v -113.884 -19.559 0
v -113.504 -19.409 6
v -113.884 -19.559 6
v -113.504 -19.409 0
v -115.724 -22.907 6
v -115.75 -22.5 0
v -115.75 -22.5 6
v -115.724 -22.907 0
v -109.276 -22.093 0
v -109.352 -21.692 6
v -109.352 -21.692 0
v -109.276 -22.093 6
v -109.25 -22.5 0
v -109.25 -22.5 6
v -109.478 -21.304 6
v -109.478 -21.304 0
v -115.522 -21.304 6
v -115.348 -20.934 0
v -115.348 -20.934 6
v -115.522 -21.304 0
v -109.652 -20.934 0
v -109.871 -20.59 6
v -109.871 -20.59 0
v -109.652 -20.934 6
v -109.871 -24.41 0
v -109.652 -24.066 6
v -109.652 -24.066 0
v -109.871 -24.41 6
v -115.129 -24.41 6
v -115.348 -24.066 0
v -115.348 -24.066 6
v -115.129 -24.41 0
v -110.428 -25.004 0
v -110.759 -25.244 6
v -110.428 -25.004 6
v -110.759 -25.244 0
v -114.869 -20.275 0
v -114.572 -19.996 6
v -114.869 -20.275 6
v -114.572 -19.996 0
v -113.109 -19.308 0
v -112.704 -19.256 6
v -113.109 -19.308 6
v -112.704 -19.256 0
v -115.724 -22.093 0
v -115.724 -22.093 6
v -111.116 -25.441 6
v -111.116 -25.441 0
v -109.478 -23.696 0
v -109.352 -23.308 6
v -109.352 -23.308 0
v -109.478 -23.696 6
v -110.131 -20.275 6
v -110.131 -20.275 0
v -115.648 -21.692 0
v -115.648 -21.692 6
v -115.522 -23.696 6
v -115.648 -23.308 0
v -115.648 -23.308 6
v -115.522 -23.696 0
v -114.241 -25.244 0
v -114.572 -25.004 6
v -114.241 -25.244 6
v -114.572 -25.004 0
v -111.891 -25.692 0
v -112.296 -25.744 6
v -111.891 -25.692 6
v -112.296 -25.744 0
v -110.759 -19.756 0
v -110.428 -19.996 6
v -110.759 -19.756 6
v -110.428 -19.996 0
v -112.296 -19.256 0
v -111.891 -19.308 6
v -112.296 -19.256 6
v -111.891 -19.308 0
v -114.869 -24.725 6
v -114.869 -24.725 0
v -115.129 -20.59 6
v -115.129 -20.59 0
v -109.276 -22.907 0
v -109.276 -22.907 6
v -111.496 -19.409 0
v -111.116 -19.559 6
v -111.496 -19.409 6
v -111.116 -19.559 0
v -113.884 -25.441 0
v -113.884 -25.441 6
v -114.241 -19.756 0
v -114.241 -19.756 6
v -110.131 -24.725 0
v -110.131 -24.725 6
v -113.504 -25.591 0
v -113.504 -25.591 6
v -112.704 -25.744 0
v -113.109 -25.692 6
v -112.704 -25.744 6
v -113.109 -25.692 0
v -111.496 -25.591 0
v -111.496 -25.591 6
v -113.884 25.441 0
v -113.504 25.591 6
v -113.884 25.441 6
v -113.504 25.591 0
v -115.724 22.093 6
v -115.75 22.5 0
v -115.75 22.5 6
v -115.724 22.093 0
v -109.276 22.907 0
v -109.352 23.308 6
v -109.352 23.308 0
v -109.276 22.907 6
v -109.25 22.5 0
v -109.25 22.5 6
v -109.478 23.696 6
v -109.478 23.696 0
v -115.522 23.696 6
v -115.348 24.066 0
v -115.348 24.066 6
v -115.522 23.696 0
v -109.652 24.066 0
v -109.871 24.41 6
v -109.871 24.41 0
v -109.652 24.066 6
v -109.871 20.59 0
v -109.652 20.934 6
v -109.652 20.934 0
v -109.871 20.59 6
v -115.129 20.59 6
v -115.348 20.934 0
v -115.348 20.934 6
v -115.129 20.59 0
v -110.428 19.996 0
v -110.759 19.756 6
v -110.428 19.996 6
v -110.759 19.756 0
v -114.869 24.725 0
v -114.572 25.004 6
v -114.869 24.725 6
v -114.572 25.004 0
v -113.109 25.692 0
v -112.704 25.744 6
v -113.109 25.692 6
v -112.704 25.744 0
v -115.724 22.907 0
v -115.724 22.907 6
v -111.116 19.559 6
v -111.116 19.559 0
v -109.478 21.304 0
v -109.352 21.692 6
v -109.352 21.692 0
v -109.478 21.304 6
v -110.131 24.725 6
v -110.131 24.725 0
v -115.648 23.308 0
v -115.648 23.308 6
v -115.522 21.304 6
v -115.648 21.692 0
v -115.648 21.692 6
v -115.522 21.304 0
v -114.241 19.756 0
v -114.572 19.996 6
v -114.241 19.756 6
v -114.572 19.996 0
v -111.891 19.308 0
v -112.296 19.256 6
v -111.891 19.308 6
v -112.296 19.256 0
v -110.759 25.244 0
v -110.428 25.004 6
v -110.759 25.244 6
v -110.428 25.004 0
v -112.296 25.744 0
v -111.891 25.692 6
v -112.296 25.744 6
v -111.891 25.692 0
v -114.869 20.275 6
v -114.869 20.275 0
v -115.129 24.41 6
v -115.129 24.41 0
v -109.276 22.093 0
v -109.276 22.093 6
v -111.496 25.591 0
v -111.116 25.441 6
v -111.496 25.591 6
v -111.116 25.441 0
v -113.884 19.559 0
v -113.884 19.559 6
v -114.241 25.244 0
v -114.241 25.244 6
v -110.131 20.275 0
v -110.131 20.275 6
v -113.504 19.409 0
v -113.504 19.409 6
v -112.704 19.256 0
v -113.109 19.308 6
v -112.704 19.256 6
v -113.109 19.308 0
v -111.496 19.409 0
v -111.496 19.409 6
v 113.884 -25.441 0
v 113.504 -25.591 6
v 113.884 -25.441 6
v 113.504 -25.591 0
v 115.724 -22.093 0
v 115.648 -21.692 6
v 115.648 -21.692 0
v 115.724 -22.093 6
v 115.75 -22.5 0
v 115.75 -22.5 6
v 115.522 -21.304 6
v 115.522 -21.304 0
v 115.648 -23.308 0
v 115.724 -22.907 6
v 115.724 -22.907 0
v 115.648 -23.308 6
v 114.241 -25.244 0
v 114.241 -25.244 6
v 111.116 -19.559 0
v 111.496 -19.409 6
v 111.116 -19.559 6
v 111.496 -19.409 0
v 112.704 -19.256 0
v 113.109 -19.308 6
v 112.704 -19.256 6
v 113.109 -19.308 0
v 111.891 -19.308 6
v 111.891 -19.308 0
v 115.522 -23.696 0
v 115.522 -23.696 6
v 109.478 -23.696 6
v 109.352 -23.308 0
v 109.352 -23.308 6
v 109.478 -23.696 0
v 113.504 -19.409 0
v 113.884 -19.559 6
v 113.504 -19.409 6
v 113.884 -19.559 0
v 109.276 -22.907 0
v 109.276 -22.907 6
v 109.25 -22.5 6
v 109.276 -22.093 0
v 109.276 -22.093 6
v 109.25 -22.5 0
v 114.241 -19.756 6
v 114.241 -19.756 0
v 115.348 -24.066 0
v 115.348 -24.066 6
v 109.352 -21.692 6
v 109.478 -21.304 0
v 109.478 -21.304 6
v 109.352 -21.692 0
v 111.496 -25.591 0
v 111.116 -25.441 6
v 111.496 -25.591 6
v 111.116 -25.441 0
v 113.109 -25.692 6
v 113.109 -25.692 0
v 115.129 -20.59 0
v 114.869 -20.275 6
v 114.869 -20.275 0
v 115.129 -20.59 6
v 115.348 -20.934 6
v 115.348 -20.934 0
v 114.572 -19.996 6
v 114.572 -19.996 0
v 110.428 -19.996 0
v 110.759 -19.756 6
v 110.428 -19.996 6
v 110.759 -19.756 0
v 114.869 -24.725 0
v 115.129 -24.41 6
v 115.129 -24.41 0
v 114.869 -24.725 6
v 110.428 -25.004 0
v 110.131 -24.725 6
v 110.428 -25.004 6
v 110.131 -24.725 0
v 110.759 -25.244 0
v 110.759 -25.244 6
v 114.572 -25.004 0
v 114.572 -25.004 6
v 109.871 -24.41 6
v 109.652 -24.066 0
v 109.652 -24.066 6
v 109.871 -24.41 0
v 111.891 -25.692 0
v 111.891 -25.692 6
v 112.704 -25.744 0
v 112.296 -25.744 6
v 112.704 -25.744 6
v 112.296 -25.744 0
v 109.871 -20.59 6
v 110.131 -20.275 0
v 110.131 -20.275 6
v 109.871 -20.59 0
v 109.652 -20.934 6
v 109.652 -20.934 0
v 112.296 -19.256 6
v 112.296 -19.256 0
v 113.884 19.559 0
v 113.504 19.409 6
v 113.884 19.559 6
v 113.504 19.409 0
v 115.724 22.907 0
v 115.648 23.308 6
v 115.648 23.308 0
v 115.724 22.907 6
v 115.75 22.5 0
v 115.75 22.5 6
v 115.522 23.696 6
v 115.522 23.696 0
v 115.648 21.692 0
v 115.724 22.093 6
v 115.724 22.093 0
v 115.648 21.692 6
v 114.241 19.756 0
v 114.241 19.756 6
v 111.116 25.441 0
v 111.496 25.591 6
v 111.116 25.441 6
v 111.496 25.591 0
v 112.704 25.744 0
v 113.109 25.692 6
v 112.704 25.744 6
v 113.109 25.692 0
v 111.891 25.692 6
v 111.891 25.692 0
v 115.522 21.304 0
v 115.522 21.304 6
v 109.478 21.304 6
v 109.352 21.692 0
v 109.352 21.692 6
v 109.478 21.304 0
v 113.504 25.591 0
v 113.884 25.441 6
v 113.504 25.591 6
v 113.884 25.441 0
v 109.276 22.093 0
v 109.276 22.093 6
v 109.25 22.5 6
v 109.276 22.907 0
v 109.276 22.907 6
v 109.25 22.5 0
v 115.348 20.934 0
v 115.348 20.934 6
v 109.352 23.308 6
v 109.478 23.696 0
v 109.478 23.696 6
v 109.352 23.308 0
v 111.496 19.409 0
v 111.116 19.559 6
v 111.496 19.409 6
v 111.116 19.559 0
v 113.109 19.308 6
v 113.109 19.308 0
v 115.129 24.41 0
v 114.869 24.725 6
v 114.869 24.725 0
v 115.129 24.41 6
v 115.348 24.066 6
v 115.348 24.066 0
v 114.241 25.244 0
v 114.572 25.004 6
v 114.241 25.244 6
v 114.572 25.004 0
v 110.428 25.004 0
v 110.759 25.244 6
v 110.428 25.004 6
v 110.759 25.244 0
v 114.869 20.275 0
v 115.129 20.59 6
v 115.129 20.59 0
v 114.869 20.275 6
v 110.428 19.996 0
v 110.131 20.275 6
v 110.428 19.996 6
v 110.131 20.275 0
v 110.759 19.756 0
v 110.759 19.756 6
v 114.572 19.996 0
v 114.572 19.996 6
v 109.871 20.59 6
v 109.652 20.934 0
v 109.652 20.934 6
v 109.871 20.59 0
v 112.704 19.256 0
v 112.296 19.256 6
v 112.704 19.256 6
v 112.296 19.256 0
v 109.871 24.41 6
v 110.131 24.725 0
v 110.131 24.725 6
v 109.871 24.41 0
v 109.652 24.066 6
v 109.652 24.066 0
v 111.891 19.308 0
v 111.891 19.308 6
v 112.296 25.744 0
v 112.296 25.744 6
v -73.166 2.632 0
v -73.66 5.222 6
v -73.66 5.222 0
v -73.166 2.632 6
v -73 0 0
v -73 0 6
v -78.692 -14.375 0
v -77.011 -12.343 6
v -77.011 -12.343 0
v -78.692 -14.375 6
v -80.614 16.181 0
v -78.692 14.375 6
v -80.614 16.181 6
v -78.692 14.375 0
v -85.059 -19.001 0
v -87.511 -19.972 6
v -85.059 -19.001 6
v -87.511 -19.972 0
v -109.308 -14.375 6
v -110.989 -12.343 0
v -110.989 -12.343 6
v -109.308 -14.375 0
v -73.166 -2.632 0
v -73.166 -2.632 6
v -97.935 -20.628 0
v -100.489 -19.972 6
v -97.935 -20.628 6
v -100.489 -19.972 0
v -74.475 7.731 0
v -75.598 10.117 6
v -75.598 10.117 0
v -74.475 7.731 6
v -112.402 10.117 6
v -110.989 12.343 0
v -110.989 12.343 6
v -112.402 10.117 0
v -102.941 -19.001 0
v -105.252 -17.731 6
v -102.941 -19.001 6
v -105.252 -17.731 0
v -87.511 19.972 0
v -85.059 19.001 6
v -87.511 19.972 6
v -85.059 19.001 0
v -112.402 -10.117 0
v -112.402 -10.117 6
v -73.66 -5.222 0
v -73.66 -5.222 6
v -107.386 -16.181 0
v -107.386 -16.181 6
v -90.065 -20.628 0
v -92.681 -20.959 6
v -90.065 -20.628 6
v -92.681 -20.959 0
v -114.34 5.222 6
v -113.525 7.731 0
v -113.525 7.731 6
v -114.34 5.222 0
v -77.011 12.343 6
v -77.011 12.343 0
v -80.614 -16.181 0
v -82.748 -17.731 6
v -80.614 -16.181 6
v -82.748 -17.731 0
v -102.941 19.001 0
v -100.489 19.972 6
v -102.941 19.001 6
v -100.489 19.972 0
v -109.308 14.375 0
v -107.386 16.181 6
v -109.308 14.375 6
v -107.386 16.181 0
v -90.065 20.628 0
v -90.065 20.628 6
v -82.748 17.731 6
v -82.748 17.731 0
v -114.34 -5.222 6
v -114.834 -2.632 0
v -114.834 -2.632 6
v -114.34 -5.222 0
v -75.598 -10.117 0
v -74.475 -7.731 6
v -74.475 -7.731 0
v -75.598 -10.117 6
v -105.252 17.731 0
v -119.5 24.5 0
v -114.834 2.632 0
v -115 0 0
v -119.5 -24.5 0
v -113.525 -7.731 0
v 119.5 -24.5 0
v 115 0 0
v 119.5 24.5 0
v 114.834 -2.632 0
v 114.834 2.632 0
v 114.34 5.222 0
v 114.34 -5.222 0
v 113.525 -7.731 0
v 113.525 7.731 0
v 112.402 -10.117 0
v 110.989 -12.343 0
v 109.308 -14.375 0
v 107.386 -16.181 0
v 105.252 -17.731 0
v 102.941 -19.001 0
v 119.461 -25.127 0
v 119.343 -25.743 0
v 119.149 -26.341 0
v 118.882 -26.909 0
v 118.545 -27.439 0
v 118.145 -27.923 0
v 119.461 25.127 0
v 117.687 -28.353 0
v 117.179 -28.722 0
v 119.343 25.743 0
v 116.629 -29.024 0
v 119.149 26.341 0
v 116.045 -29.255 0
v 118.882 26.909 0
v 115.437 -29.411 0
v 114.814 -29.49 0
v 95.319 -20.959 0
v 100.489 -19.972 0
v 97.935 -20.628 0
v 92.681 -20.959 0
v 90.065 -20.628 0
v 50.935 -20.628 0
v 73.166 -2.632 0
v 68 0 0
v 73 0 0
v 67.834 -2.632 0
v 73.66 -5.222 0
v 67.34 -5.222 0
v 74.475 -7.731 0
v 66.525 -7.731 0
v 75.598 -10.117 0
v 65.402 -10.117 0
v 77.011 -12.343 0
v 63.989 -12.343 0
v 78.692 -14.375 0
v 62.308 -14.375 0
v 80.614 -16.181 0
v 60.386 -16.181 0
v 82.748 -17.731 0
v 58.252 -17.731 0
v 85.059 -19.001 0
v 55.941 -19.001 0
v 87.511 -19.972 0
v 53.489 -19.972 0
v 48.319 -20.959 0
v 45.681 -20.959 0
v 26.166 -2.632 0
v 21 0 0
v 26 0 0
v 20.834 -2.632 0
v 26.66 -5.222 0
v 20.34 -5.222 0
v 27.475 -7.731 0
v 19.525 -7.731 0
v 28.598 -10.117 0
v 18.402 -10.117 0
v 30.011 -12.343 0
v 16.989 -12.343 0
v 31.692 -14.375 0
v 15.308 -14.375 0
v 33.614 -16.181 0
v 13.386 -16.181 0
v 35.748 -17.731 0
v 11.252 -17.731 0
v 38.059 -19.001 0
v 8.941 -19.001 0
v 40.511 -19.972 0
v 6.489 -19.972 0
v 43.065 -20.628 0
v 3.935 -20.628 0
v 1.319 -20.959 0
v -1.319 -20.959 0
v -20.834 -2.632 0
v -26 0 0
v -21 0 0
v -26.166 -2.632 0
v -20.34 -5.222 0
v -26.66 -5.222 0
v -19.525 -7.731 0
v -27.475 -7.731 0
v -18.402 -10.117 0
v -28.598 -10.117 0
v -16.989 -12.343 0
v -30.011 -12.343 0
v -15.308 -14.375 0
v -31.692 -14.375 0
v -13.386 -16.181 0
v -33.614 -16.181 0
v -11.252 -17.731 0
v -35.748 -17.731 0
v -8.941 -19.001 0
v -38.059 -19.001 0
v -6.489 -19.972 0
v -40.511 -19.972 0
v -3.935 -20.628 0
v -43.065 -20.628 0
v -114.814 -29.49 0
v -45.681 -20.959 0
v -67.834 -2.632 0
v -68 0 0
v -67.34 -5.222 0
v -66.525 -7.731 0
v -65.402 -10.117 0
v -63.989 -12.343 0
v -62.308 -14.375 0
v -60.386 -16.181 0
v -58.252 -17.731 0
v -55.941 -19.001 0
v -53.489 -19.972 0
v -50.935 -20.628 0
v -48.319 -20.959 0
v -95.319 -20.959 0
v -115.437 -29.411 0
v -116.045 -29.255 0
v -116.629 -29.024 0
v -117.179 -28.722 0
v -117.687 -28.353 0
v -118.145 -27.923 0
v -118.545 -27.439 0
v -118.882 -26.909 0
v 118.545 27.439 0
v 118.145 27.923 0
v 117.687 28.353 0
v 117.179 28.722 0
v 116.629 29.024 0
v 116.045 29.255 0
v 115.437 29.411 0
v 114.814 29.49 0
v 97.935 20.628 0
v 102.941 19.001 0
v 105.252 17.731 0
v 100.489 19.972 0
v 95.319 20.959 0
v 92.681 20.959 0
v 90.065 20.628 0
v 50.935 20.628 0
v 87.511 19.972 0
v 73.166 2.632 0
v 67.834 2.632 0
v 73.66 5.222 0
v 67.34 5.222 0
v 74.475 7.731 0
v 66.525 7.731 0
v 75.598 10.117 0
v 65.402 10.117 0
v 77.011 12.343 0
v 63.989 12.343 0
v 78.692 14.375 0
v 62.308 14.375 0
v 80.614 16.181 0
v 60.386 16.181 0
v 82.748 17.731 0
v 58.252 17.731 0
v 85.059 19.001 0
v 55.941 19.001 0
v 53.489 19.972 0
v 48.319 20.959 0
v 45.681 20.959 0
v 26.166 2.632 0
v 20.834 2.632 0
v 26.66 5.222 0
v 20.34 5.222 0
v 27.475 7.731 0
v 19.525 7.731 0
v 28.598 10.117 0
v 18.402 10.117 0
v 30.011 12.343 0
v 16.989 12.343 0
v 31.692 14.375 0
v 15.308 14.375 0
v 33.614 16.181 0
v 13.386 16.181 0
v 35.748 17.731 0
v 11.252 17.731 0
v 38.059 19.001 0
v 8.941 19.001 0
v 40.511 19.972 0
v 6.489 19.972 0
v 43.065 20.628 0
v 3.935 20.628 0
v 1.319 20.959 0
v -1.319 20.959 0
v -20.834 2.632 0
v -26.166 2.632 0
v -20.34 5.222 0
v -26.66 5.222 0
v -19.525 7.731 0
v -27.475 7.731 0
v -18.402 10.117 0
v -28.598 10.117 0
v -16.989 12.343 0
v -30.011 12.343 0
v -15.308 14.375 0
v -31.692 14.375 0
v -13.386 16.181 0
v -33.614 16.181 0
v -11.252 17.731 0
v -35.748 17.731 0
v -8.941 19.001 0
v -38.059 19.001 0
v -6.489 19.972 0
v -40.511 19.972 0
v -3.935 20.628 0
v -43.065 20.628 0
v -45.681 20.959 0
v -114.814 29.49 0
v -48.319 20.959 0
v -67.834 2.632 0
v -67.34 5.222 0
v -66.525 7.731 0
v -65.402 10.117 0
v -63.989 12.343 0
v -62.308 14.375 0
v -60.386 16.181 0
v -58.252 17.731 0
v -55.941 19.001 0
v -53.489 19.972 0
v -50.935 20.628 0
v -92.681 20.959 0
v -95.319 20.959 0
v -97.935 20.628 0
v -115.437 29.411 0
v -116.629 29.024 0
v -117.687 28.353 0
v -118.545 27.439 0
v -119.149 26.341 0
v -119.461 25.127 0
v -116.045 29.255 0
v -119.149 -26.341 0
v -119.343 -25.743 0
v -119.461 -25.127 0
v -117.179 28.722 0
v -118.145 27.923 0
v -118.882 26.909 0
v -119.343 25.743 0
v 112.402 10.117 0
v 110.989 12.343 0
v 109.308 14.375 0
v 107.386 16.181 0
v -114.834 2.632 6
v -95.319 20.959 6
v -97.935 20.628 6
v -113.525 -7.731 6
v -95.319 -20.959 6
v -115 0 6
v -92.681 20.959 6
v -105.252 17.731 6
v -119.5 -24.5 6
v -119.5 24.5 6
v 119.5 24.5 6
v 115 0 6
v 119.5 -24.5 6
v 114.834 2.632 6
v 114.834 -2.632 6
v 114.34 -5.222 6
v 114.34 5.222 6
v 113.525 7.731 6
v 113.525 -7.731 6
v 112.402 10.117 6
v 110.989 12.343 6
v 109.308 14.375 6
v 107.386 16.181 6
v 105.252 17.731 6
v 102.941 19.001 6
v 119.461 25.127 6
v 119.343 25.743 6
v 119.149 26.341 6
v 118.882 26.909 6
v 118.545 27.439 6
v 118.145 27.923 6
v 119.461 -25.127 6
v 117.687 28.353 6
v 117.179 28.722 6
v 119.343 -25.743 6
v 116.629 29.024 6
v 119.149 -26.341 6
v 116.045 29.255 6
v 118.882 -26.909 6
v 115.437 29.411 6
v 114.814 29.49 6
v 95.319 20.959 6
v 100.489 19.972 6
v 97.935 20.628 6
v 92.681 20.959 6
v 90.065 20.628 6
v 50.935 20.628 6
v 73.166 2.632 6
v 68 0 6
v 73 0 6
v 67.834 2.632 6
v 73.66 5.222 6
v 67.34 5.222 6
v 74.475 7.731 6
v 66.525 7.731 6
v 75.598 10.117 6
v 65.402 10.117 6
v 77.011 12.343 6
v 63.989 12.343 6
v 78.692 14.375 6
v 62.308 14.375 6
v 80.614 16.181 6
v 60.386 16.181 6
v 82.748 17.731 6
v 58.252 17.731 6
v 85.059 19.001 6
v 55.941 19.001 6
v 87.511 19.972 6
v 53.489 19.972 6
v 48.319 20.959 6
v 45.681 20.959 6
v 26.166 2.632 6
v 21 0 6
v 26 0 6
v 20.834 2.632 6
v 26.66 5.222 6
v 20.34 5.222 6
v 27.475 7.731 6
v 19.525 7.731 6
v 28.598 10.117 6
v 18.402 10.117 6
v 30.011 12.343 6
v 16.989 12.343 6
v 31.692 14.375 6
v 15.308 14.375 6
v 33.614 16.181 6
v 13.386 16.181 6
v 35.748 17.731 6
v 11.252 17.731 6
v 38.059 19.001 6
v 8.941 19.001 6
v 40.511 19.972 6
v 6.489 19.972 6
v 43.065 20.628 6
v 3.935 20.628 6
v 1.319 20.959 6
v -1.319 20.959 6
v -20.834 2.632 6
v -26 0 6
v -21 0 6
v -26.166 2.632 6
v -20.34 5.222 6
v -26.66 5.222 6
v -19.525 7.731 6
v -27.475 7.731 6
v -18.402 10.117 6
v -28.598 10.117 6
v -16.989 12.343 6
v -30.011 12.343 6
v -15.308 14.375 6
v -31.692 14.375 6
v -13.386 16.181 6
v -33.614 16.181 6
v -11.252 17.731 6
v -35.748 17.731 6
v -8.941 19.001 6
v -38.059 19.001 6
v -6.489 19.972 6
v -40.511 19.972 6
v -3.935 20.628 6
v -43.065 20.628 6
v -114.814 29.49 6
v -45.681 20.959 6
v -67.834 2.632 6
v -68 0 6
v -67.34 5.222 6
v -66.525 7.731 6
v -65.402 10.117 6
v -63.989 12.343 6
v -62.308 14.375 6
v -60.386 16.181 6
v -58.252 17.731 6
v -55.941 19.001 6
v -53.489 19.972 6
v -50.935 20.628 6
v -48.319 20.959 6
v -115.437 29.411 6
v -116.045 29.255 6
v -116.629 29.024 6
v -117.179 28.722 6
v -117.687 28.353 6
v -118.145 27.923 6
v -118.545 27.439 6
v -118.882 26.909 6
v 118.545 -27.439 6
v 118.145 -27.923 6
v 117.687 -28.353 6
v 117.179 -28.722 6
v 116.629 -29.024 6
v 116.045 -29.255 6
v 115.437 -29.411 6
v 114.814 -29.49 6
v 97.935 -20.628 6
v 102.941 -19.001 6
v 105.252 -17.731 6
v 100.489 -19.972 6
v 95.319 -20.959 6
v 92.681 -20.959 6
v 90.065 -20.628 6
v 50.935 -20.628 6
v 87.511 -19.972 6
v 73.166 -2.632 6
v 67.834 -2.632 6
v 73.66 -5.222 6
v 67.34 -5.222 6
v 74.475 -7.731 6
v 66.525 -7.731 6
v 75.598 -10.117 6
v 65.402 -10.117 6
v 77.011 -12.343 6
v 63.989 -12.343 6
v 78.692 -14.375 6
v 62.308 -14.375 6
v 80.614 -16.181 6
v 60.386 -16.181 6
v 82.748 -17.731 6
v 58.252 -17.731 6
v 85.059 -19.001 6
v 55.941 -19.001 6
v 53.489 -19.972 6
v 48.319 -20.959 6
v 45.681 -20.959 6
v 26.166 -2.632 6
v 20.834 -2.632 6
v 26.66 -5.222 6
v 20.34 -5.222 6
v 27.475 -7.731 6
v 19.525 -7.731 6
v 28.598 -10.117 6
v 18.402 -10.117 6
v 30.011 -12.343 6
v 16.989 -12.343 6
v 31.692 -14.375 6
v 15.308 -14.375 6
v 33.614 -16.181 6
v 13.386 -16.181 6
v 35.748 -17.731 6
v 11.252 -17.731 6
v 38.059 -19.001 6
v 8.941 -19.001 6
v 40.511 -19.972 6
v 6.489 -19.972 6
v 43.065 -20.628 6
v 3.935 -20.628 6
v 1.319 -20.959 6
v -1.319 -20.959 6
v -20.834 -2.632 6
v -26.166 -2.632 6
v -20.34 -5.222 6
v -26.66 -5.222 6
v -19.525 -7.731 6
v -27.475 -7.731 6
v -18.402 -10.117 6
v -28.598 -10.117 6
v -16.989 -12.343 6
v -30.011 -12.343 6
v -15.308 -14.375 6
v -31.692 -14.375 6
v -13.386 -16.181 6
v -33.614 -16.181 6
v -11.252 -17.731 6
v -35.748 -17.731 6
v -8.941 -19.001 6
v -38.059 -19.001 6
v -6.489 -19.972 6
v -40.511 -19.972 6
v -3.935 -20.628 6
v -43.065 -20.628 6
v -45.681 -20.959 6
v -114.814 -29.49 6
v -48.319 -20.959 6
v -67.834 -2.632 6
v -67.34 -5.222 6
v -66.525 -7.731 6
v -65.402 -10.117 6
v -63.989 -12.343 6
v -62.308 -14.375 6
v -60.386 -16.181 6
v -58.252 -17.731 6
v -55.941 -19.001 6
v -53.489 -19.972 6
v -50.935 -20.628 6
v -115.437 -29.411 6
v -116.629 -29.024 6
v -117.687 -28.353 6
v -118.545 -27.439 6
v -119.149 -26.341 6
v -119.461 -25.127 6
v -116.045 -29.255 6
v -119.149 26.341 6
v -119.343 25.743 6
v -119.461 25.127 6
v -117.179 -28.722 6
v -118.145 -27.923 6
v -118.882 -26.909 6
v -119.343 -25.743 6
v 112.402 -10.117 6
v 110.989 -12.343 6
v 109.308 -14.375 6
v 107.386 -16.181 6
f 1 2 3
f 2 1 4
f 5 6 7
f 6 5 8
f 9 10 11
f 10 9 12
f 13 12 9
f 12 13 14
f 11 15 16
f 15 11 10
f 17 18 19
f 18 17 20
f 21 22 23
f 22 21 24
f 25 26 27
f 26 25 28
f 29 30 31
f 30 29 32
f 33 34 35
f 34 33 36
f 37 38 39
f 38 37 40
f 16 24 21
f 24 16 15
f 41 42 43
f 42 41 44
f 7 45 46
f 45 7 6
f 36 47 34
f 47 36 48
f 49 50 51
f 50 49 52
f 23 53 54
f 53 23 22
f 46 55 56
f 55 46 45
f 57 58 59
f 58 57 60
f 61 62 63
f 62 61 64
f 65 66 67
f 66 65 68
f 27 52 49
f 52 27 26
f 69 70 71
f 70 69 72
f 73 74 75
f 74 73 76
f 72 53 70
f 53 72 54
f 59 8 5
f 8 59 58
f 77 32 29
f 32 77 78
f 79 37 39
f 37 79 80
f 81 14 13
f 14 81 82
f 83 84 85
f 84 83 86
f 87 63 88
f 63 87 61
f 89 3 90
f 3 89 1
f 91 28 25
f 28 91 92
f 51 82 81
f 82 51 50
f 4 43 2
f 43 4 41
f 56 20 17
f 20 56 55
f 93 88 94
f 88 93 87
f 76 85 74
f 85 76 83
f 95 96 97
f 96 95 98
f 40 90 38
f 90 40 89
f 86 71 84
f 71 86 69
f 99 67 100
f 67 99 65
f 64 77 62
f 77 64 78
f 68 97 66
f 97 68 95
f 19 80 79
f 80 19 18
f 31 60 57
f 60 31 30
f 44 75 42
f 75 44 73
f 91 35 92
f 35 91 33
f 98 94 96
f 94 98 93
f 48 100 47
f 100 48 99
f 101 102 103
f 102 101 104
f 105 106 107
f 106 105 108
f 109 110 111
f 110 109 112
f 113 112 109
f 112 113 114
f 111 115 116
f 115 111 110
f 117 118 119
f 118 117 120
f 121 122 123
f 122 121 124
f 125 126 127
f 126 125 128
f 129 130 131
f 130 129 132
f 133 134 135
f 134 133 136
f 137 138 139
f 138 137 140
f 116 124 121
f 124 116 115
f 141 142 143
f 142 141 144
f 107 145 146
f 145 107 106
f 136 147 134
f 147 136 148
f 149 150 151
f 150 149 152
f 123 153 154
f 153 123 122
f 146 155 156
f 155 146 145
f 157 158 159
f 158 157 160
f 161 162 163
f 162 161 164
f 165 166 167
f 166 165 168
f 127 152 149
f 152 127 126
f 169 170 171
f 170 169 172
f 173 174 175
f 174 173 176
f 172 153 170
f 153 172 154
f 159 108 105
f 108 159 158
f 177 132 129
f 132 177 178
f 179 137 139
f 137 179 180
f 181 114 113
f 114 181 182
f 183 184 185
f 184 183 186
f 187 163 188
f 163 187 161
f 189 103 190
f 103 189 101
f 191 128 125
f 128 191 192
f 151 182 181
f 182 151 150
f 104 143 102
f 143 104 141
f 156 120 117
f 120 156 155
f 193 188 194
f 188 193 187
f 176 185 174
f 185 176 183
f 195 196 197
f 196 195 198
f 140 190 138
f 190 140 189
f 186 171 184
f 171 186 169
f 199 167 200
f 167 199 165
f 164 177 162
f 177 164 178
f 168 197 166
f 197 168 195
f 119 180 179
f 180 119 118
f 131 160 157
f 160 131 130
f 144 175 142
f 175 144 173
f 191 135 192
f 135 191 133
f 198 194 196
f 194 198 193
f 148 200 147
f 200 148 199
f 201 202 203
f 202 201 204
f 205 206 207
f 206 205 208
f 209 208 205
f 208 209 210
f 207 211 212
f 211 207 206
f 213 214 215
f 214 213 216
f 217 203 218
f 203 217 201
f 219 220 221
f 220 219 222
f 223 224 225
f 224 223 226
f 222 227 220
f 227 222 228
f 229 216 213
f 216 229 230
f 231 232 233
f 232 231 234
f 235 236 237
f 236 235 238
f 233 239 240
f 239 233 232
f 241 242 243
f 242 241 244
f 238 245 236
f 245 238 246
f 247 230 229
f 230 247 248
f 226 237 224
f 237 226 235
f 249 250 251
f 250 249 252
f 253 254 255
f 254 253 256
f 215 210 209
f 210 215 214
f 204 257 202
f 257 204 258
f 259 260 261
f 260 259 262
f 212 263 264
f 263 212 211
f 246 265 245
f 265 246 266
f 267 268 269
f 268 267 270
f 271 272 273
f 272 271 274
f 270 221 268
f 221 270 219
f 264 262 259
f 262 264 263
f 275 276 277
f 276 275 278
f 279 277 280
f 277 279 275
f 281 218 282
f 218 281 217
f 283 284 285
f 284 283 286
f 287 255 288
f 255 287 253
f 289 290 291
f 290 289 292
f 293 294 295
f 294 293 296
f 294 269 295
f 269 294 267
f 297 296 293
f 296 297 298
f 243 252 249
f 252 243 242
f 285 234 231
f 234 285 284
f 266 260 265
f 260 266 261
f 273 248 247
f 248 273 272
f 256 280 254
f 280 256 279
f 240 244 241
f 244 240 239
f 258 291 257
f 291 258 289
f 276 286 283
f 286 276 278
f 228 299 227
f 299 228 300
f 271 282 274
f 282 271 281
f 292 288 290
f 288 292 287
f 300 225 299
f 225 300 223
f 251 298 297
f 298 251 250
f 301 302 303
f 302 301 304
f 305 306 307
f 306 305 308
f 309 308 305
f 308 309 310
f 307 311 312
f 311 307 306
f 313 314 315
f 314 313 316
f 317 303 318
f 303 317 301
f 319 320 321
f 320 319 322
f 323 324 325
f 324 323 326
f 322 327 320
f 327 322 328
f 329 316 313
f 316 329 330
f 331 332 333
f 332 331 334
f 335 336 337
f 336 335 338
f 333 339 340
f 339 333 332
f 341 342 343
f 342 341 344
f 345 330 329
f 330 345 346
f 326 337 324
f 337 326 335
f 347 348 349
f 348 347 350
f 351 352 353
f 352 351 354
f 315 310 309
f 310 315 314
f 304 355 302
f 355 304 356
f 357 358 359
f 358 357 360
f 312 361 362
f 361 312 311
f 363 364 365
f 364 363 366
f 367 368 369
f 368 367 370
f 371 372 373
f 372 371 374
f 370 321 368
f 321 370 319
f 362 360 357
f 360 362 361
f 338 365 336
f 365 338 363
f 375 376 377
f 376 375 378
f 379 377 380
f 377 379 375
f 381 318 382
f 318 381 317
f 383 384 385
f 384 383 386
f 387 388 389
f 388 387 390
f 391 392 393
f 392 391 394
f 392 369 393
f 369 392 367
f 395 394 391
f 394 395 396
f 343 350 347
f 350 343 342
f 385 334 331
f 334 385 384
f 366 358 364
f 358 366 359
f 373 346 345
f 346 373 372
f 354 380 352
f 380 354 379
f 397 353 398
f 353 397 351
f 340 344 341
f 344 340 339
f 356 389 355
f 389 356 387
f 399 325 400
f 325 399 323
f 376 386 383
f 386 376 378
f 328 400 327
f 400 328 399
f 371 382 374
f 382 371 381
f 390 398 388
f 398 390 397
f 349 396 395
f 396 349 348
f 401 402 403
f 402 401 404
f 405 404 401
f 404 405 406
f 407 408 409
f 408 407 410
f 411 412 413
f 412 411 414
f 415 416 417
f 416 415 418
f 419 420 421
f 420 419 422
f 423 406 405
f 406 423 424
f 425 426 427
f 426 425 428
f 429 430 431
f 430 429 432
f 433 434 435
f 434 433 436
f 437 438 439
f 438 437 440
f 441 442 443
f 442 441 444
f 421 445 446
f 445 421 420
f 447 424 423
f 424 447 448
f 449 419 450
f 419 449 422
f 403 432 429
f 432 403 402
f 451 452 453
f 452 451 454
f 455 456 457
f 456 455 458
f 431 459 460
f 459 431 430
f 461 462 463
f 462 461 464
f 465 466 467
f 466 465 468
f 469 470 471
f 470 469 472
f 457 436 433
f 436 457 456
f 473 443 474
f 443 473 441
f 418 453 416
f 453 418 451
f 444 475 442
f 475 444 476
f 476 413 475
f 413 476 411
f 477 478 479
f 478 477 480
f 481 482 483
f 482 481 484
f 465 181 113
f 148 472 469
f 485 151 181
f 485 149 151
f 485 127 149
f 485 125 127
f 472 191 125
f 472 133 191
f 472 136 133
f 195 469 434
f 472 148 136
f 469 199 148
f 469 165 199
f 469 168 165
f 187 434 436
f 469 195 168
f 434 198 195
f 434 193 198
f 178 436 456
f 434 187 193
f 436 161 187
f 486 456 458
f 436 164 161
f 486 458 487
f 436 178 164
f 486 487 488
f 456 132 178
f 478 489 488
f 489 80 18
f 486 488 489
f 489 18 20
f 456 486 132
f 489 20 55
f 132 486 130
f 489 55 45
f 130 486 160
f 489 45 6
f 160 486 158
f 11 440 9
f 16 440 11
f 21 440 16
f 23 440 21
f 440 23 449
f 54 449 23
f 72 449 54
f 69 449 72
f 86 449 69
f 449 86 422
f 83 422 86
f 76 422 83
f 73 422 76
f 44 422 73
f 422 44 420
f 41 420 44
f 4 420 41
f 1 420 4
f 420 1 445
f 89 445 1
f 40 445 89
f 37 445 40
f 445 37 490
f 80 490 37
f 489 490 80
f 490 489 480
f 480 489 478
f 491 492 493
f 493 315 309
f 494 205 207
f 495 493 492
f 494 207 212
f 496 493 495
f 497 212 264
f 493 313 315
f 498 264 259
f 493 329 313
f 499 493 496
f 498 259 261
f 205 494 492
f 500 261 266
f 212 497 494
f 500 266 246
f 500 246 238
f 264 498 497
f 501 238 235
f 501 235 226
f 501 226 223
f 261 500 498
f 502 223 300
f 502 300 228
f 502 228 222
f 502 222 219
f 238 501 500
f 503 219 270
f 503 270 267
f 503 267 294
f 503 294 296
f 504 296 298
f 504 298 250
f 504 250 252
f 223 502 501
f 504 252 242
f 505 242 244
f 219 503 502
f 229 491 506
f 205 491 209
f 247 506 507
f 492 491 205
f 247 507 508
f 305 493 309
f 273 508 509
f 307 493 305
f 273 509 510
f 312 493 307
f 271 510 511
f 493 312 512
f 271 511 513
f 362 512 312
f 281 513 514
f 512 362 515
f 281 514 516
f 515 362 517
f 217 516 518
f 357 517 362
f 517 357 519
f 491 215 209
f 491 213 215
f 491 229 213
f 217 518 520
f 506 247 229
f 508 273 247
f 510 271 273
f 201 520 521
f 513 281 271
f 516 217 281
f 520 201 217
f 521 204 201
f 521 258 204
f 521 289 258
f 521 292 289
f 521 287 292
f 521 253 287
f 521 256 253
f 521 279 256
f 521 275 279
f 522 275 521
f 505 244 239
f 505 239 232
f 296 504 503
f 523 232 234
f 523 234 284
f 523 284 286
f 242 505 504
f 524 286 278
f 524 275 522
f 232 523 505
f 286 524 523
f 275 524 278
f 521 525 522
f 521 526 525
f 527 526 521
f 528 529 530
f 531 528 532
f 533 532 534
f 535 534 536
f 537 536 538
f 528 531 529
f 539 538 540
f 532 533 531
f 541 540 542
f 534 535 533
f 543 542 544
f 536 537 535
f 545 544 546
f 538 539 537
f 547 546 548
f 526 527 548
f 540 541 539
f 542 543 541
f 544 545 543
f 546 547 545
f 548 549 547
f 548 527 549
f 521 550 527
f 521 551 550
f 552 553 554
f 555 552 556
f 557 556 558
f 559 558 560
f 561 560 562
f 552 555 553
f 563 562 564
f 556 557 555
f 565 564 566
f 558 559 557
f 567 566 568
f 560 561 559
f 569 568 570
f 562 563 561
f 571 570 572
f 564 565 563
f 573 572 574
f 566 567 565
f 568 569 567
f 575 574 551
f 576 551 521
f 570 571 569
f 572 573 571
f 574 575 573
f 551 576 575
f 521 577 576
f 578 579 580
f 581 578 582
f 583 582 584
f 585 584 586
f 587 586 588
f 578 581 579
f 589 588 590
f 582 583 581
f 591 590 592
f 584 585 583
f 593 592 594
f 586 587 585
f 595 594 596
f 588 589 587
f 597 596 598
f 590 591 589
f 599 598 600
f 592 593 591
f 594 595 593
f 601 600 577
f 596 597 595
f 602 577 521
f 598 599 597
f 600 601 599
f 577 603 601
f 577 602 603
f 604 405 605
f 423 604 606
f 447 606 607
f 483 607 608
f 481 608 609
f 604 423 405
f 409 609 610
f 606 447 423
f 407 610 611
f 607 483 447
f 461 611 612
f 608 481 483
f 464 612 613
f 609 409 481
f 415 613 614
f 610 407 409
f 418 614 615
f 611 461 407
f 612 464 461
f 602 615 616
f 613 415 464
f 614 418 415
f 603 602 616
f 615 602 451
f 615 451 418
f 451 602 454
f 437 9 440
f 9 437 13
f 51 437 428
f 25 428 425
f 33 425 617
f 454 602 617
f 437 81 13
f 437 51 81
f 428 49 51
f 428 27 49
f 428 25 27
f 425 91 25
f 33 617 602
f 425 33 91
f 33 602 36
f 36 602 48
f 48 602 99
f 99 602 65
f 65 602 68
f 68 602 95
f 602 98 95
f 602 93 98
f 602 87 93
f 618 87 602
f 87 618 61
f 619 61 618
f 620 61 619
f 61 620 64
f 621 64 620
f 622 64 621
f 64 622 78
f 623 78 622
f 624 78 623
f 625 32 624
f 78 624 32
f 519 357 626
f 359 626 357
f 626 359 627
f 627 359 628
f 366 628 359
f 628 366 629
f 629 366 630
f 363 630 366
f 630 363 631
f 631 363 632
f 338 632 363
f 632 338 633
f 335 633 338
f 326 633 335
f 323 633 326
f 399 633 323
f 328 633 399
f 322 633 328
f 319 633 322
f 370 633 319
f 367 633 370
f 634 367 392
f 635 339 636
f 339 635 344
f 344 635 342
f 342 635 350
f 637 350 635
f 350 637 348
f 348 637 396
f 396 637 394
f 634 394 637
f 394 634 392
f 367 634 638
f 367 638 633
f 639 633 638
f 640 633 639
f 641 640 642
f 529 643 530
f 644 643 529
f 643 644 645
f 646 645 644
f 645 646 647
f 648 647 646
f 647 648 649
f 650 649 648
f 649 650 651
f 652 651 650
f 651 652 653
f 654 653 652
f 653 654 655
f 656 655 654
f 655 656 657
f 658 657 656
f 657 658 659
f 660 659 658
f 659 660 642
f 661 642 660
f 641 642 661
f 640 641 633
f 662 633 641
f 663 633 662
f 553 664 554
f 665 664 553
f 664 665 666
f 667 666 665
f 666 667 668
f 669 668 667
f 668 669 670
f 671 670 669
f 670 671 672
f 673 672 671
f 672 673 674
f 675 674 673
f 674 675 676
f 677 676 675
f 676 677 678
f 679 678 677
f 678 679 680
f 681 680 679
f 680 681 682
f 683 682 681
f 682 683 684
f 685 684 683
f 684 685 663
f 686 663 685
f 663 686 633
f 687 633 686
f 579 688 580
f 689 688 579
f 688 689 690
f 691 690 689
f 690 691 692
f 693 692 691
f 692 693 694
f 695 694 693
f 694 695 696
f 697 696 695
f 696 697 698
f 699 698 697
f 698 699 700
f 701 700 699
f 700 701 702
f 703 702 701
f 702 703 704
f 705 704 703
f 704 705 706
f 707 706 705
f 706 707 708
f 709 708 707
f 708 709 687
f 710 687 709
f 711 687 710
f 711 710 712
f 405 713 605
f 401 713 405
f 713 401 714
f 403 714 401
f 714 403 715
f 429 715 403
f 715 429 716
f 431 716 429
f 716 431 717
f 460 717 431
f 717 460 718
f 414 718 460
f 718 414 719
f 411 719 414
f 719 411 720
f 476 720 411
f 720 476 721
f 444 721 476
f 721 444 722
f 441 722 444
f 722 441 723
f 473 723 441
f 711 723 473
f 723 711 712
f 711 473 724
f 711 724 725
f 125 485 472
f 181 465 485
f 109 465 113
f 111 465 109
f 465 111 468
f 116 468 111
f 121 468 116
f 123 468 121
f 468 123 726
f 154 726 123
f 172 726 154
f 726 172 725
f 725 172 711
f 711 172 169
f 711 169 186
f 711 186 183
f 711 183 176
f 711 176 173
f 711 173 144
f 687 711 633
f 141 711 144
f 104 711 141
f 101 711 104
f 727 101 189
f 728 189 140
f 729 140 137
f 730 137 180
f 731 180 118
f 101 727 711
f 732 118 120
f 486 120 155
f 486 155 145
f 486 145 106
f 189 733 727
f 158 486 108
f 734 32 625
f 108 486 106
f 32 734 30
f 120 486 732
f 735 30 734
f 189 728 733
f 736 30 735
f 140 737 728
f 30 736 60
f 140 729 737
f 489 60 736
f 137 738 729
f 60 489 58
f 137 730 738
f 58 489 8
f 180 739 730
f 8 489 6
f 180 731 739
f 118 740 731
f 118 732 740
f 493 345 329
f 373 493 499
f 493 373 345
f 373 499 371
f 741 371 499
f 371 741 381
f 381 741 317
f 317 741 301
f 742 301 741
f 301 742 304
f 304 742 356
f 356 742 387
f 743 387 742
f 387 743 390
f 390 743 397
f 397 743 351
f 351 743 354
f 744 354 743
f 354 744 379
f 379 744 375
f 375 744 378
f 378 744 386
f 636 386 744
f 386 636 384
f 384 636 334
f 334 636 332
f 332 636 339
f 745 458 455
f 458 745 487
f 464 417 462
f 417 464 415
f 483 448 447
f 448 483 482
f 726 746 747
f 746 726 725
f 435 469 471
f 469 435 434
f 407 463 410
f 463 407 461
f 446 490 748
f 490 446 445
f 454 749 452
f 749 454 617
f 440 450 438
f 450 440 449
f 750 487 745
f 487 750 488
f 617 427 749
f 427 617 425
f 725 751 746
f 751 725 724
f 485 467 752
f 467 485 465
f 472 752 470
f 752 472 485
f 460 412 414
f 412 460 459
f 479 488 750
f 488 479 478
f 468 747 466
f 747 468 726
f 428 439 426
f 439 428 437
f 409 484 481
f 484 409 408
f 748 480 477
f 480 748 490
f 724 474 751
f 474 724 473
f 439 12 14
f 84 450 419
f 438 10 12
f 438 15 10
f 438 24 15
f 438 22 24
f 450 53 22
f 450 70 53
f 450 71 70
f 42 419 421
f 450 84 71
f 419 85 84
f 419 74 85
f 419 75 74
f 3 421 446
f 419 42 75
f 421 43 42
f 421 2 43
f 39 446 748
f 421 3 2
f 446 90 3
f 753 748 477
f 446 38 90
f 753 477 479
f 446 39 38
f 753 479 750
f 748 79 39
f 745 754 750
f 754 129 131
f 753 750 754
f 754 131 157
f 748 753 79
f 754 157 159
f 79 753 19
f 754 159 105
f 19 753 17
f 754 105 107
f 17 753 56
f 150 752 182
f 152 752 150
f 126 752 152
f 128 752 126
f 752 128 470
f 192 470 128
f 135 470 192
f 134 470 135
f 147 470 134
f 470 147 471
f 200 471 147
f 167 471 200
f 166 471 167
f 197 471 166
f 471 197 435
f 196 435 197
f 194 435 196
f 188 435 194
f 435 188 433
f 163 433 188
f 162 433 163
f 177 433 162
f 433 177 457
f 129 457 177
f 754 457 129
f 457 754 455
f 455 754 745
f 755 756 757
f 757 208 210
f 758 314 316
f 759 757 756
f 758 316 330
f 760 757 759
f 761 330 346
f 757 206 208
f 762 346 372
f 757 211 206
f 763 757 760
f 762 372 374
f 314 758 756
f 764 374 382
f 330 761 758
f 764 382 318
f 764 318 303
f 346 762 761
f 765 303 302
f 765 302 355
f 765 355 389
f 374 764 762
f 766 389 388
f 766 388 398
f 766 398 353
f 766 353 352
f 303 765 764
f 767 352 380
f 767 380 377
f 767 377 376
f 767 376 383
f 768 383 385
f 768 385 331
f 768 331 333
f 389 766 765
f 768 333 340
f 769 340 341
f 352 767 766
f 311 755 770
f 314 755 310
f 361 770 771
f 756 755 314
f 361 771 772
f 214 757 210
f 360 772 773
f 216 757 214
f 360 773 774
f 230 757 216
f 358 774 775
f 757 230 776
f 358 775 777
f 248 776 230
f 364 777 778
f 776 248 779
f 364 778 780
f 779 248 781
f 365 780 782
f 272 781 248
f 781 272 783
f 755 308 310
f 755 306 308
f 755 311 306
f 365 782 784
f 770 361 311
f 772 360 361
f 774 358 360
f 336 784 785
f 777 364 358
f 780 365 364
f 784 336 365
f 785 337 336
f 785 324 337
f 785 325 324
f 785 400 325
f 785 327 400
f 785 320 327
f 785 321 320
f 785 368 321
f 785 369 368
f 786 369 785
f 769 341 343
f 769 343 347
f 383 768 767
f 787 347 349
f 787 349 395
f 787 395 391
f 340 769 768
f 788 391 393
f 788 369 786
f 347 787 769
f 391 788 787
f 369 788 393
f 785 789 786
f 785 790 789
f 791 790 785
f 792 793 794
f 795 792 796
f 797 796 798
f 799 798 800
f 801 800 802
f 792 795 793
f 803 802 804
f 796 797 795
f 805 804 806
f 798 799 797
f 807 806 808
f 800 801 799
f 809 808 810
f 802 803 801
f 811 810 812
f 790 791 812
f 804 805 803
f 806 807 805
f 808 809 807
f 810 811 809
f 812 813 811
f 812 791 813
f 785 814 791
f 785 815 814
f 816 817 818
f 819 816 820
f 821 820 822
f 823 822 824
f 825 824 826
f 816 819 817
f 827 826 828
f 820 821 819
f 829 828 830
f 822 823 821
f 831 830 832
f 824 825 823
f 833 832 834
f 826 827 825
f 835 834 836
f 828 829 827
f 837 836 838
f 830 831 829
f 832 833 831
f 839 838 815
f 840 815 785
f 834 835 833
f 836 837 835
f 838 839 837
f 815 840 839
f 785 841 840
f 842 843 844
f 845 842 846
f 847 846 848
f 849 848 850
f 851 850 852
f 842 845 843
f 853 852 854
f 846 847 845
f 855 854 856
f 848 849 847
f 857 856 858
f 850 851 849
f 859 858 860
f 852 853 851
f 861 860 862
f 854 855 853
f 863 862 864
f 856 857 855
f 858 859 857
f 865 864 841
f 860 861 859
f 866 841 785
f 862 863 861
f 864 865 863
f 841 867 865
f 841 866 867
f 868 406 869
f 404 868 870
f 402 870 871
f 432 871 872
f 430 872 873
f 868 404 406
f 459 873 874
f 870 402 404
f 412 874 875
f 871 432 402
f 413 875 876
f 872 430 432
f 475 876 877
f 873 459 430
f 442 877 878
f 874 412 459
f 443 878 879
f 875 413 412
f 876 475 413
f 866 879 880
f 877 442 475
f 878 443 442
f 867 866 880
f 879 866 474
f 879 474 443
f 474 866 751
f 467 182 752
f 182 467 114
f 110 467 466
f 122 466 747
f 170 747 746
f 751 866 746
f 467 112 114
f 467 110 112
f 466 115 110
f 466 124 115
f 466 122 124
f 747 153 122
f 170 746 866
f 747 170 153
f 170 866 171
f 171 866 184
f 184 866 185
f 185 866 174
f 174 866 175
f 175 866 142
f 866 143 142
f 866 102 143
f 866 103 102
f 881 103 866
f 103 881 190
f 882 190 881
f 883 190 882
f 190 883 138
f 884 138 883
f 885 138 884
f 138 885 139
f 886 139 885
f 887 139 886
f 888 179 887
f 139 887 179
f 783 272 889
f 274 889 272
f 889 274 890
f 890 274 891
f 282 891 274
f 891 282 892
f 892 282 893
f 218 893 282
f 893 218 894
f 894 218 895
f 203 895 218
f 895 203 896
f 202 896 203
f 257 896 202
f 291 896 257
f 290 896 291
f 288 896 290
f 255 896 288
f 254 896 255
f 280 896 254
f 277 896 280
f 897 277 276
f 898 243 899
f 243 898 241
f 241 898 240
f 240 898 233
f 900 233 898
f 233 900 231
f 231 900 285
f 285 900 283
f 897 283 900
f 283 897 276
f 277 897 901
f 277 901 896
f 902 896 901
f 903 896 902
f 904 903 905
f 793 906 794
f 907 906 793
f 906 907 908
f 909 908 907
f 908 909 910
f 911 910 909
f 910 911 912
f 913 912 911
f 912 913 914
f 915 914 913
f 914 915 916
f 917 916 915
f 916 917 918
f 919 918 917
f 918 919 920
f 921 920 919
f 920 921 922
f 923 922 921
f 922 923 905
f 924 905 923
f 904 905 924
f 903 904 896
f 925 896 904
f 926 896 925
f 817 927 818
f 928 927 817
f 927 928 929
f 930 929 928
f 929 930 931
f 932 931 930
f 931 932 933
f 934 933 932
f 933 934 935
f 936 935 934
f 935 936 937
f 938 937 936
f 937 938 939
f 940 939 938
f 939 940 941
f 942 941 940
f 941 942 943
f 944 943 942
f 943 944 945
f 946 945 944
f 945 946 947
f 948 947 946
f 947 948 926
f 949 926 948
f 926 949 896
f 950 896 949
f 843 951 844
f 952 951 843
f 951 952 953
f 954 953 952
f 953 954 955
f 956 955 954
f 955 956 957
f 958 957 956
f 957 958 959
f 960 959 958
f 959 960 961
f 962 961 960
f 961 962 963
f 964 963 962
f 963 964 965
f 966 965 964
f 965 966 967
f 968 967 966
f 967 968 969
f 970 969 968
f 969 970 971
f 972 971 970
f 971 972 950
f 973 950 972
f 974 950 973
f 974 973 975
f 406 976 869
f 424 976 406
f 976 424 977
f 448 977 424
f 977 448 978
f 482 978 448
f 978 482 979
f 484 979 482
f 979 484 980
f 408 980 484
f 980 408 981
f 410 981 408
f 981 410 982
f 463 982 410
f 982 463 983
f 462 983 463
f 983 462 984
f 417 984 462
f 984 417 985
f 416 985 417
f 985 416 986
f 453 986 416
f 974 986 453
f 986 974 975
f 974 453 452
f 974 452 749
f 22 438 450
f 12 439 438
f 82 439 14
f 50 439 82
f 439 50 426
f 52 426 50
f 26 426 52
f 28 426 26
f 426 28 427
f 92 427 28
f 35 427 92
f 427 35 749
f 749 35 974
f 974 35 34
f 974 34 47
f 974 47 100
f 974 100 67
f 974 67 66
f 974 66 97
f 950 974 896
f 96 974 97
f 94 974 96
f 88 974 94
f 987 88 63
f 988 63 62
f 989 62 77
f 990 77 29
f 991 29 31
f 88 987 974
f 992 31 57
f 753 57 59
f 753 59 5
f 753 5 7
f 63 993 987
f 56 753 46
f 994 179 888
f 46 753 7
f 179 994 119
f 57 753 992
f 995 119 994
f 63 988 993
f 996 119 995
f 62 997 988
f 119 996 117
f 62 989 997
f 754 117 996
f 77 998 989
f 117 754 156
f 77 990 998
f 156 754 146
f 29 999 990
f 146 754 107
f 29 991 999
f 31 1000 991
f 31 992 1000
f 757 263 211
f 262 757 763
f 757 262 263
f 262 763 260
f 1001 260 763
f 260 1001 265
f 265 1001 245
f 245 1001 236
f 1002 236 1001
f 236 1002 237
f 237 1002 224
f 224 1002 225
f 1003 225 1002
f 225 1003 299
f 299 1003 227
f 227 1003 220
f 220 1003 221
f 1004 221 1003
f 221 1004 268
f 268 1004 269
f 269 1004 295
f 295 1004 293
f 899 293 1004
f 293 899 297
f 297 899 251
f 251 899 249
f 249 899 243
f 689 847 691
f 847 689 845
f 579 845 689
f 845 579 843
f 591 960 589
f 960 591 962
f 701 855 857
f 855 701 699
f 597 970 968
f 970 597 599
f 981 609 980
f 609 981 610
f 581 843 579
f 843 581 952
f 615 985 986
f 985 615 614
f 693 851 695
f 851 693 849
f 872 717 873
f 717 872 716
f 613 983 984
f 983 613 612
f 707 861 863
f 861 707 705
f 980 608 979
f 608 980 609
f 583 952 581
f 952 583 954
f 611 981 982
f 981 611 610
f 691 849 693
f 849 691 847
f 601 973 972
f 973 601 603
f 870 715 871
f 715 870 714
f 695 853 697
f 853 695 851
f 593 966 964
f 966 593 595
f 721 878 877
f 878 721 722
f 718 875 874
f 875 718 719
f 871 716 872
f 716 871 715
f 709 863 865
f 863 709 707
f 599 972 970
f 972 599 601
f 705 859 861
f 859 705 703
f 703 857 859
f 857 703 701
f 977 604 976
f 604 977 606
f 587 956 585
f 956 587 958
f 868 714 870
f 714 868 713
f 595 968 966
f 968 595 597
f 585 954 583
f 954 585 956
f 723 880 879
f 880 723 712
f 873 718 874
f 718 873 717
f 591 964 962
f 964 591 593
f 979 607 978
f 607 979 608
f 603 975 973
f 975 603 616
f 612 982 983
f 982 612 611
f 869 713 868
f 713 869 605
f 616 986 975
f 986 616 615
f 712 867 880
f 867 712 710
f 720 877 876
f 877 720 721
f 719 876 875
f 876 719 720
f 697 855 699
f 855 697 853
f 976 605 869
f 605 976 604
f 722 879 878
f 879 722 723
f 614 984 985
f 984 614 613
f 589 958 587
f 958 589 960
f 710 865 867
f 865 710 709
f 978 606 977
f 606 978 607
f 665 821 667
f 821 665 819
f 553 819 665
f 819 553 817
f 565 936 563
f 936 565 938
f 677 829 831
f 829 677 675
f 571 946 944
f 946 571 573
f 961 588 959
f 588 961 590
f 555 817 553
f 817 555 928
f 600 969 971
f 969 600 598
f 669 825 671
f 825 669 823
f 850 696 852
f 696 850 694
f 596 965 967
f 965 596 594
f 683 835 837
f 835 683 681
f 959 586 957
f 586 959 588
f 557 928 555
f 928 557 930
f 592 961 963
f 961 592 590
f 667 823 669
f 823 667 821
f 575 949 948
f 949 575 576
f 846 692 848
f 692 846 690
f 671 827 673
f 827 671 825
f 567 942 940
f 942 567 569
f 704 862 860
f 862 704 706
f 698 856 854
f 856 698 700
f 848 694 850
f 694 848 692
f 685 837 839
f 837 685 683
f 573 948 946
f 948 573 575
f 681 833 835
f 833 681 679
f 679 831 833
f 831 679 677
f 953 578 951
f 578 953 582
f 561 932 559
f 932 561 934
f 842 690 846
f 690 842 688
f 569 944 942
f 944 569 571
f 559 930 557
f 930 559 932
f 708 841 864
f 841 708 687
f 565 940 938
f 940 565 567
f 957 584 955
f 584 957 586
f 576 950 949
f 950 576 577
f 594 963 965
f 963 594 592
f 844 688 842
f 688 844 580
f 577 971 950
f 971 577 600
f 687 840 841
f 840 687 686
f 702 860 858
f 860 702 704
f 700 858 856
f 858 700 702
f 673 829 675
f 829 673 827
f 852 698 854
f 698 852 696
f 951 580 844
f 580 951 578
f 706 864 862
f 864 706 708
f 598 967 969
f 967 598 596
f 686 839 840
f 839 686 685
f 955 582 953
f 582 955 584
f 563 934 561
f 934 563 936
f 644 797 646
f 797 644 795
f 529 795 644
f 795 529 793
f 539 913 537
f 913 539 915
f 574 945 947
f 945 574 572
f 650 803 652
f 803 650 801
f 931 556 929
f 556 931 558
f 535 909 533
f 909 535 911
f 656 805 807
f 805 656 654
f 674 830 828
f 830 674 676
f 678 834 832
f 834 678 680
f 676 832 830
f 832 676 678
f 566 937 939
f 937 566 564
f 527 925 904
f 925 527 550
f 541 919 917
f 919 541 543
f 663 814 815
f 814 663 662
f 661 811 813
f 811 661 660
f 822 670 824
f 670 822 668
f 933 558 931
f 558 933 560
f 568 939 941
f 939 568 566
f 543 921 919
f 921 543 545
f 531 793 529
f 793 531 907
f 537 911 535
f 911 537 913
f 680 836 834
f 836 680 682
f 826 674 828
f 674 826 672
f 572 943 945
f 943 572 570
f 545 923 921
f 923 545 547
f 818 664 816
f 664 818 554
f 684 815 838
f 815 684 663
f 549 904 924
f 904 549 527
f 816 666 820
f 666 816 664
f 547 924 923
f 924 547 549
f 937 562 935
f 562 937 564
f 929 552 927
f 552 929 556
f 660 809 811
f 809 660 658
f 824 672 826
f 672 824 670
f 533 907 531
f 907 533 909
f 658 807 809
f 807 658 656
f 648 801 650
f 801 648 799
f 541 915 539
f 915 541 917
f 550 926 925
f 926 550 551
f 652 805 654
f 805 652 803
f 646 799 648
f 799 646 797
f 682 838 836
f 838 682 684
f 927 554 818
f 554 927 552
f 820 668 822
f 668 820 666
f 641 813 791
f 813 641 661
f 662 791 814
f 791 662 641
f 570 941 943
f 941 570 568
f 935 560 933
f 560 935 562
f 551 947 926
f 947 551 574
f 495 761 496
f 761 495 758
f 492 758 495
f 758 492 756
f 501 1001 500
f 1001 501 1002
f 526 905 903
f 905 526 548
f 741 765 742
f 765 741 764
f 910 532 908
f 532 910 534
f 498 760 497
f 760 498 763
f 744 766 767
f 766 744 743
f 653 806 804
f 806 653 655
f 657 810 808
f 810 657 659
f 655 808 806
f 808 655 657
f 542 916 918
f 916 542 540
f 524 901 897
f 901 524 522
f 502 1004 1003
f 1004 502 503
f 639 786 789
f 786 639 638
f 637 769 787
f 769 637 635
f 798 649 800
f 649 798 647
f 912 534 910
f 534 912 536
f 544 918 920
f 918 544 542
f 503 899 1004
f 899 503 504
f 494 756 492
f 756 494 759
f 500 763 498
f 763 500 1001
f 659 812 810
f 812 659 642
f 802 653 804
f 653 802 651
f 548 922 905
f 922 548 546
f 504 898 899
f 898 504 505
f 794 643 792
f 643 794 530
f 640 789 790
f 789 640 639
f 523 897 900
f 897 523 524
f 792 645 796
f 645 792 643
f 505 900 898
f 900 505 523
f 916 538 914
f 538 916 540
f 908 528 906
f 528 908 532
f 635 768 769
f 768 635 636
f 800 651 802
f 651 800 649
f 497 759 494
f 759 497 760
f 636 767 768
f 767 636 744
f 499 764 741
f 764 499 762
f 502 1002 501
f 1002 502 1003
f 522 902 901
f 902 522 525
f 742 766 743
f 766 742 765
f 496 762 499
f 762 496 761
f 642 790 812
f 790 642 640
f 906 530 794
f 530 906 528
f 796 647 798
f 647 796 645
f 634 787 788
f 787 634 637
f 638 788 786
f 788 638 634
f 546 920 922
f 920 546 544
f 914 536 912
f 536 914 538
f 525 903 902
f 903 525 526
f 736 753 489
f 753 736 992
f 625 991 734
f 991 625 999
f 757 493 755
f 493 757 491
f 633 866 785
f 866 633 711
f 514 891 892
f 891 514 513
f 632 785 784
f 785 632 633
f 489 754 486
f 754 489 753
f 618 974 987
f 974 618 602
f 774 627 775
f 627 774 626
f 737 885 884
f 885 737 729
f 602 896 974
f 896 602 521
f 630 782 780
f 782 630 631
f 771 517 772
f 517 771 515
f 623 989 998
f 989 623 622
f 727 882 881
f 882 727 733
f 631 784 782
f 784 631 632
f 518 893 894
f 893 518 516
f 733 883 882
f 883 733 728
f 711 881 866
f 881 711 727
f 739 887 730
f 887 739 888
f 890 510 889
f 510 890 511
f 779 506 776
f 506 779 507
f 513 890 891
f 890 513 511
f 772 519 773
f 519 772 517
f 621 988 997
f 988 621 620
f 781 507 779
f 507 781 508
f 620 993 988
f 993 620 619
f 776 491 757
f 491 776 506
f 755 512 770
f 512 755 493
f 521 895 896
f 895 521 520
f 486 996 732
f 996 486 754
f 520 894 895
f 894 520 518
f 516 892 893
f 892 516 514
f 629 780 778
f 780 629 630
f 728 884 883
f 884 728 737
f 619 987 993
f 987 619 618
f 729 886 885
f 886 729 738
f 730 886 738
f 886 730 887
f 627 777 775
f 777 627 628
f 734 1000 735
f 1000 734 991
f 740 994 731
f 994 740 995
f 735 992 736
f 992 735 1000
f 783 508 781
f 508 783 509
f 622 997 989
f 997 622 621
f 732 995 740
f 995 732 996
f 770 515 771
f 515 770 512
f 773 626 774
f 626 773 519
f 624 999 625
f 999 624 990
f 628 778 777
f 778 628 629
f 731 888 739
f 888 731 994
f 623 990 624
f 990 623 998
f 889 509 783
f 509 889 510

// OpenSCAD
$fn = 50;

difference() {
	union() {
		hull() {
			translate(v = [-114.5, 24.5, 0]) {
				cylinder(h = 6, r = 5);
			}
			translate(v = [114.5, 24.5, 0]) {
				cylinder(h = 6, r = 5);
			}
			translate(v = [-114.5, -24.5, 0]) {
				cylinder(h = 6, r = 5);
			}
			translate(v = [114.5, -24.5, 0]) {
				cylinder(h = 6, r = 5);
			}
		}
	}
	union() {
		translate(v = [-112.5, -22.5, -100.0]) {
			cylinder(h = 200, r = 3.25);
		}
		translate(v = [-112.5, 22.5, -100.0]) {
			cylinder(h = 200, r = 3.25);
		}
		translate(v = [112.5, -22.5, -100.0]) {
			cylinder(h = 200, r = 3.25);
		}
		translate(v = [112.5, 22.5, -100.0]) {
			cylinder(h = 200, r = 3.25);
		}
		translate(v = [-112.5, -22.5, -100.0]) {
			cylinder(h = 200, r = 1.8);
		}
		translate(v = [-112.5, 22.5, -100.0]) {
			cylinder(h = 200, r = 1.8);
		}
		translate(v = [112.5, -22.5, -100.0]) {
			cylinder(h = 200, r = 1.8);
		}
		translate(v = [112.5, 22.5, -100.0]) {
			cylinder(h = 200, r = 1.8);
		}
		translate(v = [-94.0, 0, 0.0]) {
			cylinder(h = 6, r = 21.0);
		}
		translate(v = [-47.0, 0, 0.0]) {
			cylinder(h = 6, r = 21.0);
		}
		cylinder(h = 6, r = 21.0);
		translate(v = [47.0, 0, 0.0]) {
			cylinder(h = 6, r = 21.0);
		}
		translate(v = [94.0, 0, 0.0]) {
			cylinder(h = 6, r = 21.0);
		}
	}
}
